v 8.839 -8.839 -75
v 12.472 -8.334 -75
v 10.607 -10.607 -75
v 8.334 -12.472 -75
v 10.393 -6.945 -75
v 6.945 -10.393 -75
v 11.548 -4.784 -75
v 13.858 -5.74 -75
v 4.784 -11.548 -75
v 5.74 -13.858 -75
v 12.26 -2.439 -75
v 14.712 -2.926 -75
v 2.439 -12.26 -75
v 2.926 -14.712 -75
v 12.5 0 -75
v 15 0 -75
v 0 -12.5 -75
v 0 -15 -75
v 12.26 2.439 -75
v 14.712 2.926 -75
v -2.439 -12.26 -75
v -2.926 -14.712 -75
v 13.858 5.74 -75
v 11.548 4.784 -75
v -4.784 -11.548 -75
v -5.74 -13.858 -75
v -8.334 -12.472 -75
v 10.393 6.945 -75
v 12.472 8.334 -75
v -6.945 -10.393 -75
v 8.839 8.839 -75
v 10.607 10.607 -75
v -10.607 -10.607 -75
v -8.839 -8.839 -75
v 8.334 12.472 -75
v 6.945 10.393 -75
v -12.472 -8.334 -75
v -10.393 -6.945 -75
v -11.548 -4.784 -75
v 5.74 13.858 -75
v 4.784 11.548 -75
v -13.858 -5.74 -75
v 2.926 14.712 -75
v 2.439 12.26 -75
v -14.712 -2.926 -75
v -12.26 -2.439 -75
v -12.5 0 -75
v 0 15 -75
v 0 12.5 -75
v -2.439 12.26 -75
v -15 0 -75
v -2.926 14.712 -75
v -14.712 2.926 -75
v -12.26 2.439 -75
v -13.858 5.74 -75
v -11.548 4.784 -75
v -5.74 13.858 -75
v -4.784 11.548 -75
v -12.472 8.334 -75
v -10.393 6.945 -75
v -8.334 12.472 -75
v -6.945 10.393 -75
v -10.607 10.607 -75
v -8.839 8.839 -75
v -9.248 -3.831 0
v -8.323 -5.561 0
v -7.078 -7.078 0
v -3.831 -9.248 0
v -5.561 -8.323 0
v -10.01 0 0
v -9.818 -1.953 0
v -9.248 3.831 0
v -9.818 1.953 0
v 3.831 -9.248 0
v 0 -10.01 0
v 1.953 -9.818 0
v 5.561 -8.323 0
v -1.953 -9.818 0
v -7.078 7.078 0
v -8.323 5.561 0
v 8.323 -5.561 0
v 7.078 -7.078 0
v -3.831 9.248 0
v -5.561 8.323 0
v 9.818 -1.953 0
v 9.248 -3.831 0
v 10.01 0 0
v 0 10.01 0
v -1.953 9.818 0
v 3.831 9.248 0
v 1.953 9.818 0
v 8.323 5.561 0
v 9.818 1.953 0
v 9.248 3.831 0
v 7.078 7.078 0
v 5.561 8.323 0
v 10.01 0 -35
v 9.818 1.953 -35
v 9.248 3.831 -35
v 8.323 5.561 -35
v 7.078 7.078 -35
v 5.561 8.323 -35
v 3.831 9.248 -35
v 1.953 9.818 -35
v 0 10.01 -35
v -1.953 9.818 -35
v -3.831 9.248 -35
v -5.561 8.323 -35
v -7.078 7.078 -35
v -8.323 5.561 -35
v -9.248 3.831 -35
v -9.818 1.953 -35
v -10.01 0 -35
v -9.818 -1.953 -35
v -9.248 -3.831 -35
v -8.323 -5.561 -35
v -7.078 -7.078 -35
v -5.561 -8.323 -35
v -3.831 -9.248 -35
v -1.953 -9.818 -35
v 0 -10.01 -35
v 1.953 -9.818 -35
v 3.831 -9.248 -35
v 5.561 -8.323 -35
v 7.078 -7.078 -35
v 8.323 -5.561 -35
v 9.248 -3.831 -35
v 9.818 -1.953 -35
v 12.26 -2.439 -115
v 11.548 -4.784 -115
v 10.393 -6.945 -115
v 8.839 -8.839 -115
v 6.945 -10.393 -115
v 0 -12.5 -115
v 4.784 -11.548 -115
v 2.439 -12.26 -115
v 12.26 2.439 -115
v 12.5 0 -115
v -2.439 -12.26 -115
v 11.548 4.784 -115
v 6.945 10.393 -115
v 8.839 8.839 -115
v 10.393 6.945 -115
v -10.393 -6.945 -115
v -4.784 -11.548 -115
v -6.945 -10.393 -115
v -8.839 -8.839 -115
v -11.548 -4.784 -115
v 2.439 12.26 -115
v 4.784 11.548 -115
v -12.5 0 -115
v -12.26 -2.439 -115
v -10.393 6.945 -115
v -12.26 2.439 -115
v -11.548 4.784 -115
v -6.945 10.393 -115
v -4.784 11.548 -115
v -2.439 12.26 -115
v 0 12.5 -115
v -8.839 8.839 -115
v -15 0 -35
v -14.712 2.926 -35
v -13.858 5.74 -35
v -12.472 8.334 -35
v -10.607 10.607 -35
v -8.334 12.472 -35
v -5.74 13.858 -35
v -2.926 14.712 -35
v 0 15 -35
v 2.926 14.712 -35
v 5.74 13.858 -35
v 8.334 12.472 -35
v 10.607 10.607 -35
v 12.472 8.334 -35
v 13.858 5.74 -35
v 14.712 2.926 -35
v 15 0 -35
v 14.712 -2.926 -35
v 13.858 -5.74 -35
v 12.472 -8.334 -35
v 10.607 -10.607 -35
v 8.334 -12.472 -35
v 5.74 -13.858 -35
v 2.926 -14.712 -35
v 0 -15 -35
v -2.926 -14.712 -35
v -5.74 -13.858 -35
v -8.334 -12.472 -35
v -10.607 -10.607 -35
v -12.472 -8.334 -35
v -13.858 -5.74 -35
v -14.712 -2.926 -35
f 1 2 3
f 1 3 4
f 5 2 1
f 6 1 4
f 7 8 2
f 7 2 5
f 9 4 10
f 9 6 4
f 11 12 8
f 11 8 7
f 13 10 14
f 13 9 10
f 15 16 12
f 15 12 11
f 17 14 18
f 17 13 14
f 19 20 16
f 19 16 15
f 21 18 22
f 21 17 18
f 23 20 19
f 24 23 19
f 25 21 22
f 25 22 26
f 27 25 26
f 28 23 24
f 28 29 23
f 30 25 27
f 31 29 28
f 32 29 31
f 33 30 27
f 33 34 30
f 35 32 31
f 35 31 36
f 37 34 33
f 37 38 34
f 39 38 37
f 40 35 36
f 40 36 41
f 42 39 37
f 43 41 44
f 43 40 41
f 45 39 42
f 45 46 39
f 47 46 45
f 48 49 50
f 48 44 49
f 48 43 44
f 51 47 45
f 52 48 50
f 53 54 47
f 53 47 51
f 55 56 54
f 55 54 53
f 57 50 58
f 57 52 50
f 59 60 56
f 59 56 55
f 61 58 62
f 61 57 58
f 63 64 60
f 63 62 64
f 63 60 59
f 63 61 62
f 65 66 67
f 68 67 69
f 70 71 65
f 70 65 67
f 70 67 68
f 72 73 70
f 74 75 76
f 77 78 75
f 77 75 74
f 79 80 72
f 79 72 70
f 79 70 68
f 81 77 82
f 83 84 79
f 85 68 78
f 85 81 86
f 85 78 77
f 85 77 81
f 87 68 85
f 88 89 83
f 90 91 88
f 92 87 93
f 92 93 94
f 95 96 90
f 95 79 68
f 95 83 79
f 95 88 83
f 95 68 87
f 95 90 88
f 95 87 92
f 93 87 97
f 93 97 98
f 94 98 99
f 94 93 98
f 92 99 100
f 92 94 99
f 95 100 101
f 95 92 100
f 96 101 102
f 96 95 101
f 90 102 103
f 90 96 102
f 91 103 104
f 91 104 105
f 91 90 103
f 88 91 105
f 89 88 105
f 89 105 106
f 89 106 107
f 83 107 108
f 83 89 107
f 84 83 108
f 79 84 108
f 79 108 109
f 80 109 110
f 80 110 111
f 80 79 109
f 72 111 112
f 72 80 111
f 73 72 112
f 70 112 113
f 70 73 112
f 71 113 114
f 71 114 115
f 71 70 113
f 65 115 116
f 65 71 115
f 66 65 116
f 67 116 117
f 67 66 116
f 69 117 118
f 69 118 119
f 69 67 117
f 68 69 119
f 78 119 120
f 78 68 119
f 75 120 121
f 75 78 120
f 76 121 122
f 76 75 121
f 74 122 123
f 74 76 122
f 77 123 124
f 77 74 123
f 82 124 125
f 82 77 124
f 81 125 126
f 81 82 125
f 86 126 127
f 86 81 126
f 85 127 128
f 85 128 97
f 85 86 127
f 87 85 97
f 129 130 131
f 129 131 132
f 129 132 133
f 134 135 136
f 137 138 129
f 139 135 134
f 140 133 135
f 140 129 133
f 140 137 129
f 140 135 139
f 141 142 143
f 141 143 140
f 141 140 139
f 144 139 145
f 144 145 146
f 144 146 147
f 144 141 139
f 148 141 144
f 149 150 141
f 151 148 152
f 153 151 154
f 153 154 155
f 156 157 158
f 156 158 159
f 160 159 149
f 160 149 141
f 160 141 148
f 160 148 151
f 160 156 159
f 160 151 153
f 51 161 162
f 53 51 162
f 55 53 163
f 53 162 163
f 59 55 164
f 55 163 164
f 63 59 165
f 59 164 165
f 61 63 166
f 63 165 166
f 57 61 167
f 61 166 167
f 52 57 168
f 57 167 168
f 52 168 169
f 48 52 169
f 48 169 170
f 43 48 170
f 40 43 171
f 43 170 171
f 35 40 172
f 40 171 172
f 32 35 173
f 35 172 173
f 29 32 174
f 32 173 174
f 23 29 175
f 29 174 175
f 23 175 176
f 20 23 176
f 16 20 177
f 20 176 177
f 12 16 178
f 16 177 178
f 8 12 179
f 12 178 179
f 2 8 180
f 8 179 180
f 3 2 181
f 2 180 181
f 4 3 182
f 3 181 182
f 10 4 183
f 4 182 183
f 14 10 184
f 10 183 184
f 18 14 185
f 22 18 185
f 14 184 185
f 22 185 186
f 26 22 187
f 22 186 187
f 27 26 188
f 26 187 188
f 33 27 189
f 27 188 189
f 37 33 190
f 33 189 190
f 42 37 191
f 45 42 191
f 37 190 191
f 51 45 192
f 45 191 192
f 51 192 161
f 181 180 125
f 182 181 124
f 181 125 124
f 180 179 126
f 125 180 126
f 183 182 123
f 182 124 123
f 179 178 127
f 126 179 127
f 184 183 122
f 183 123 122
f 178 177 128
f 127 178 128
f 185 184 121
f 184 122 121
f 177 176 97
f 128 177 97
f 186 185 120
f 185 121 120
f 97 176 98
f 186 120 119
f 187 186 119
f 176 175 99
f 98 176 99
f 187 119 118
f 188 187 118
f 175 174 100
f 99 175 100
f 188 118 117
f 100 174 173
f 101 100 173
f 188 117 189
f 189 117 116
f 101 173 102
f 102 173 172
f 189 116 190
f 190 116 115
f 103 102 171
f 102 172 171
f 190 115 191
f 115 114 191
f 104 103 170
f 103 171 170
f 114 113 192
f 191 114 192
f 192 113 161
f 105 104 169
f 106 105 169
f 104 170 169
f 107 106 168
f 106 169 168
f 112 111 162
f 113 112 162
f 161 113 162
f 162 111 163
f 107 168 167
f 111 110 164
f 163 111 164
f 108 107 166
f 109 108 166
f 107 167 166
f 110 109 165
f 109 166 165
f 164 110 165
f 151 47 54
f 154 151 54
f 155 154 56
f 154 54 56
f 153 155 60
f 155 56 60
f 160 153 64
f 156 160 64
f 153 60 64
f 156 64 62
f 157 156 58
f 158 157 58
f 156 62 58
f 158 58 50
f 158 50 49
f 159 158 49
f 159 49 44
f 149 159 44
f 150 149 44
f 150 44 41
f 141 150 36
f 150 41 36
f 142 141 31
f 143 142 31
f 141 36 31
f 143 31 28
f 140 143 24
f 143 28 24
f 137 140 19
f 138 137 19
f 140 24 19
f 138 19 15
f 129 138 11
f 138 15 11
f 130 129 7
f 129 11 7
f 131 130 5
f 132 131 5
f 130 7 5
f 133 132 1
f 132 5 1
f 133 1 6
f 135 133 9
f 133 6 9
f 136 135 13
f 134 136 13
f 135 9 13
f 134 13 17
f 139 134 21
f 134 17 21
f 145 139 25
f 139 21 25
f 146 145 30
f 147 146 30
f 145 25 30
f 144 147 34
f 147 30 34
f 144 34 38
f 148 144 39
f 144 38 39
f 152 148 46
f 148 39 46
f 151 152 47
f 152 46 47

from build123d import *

# Parameters (mm, degrees)
SKETCH2_R           = 10.01
BOSS_EXTRUDE1_DEPTH = 35
SKETCH3_R           = 15
BOSS_EXTRUDE2_DEPTH = 40
SKETCH4_R           = 12.5
BOSS_EXTRUDE3_DEPTH = 40


with BuildPart() as part:
    # Sketch2 → Boss-Extrude1 (new body)
    with BuildSketch(Plane.XY):
        Circle(SKETCH2_R)
    extrude(amount=-BOSS_EXTRUDE1_DEPTH)

    # Sketch3 → Boss-Extrude2 (add)
    with BuildSketch(Plane(origin=(0, 0, -35), x_dir=(-1, 0, 0), z_dir=(0, 0, -1))):
        Circle(SKETCH3_R)
    extrude(amount=BOSS_EXTRUDE2_DEPTH)

    # Sketch4 → Boss-Extrude3 (add)
    with BuildSketch(Plane(origin=(0, 0, -75), x_dir=(-1, 0, 0), z_dir=(0, 0, -1))):
        Circle(SKETCH4_R)
    extrude(amount=BOSS_EXTRUDE3_DEPTH)


solid = part.part
